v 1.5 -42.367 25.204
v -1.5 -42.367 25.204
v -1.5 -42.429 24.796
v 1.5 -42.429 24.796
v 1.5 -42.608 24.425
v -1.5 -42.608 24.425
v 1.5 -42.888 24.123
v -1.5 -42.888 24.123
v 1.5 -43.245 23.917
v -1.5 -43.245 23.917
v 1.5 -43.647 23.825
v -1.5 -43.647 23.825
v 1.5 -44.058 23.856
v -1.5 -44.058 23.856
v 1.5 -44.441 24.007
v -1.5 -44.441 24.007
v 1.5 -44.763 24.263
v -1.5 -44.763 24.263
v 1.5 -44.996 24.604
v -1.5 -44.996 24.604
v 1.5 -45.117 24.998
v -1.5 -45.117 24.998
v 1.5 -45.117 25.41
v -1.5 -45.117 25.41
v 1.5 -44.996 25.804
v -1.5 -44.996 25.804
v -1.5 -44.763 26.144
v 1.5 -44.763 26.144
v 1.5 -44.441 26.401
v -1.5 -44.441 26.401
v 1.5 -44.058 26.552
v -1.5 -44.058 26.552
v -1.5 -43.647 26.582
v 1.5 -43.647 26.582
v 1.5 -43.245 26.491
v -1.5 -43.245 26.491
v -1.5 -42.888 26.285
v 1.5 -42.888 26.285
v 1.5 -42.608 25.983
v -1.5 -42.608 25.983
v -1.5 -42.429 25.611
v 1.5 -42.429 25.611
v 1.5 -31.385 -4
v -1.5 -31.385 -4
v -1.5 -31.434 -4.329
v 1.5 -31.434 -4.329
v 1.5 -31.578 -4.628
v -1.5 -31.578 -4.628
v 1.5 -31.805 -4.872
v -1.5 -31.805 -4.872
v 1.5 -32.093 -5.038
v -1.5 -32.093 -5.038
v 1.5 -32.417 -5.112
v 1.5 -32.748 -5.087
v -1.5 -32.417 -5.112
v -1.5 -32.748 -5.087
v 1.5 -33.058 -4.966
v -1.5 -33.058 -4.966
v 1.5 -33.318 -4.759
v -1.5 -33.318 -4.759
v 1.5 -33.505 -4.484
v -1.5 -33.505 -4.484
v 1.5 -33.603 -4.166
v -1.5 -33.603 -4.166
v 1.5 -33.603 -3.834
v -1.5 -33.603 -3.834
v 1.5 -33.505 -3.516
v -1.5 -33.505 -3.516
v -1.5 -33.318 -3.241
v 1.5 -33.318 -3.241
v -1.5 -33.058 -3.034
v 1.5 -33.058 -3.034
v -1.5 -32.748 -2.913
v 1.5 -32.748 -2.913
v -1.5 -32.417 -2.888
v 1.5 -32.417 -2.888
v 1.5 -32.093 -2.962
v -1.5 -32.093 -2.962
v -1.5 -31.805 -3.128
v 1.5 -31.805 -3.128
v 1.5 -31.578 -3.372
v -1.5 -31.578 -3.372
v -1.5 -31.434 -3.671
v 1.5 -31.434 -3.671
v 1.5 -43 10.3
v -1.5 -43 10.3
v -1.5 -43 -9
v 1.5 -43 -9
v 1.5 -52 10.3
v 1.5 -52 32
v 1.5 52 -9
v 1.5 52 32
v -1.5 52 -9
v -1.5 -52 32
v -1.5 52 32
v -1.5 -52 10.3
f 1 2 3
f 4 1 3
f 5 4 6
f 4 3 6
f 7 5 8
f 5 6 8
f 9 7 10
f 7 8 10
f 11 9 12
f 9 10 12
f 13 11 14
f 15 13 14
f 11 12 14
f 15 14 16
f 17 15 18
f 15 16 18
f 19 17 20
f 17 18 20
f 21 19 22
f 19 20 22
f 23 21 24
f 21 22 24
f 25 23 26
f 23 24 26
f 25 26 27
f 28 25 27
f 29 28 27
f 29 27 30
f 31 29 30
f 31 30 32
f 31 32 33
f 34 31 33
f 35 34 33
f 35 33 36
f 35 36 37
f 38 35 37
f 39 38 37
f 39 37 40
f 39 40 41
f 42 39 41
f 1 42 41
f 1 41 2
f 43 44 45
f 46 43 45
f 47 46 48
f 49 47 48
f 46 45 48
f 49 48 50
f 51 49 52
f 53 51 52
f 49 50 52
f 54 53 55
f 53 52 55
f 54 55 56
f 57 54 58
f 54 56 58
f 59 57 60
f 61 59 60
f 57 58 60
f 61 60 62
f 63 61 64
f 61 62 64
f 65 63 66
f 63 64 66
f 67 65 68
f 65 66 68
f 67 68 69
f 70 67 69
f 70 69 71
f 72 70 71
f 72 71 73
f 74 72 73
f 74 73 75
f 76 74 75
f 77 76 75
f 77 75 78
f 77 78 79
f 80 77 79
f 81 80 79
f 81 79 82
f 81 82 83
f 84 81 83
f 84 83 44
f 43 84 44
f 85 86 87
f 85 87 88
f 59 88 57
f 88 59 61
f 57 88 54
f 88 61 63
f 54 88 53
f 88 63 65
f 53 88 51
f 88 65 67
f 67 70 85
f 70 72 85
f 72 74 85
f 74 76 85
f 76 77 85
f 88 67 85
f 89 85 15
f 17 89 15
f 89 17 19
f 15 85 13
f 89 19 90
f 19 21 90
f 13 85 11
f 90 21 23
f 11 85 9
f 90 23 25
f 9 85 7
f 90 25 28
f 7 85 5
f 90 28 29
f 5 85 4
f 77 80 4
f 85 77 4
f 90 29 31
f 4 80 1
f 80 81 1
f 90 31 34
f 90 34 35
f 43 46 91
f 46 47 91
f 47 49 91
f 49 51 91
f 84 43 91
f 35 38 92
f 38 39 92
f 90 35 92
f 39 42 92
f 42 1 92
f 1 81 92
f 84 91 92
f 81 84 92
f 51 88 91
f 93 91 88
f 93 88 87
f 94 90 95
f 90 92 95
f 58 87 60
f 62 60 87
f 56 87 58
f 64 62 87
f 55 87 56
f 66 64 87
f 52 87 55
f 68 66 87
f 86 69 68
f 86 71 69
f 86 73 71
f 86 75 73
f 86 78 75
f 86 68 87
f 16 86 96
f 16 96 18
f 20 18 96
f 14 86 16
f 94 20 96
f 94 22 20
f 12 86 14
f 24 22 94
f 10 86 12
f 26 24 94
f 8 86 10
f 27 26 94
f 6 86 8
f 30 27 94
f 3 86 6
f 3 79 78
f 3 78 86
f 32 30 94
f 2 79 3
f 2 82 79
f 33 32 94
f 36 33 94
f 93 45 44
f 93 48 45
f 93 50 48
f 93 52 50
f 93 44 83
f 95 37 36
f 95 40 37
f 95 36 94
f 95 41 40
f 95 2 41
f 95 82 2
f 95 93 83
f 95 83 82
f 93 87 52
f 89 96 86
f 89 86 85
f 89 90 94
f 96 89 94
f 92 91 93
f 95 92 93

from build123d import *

# Parameters (mm, degrees)
SKETCH022_W      = 3
SKETCH022_H      = 41
PAD009_DEPTH     = 52
SKETCH023_W      = 3
SKETCH023_H      = 19.3
POCKET011_DEPTH  = 9
SHAPEBINDER008_R = 1.115297
POCKET034_DEPTH  = 5
SHAPEBINDER009_R = 1.382536
POCKET035_DEPTH  = 7.001


with BuildPart() as part:
    # Sketch022 (on ShapeBinder) → Pad009 (new body, symmetric)
    with BuildSketch(Plane(origin=(0, 0, 0), x_dir=(-1, 0, 0), z_dir=(0, 1, 0))):
        with Locations((0, 11.5)):
            Rectangle(SKETCH022_W, SKETCH022_H)
    extrude(amount=PAD009_DEPTH, both=True)

    # Sketch023 (on Face5 of Pad009) → Pocket011 (cut)
    with BuildSketch(Plane.XZ.offset(52)):
        with Locations((0, 0.65)):
            Rectangle(SKETCH023_W, SKETCH023_H)
    extrude(amount=-POCKET011_DEPTH, mode=Mode.SUBTRACT)

    # ShapeBinder008 → Pocket034 (cut)
    with BuildSketch(Plane(origin=(-1.5, -32.5, -4), x_dir=(0, 1, 0), z_dir=(-1, 0, 0))):
        Circle(SHAPEBINDER008_R)
    extrude(amount=-POCKET034_DEPTH, mode=Mode.SUBTRACT)

    # ShapeBinder009 → Pocket035 (cut, through all)
    with BuildSketch(Plane(origin=(-5.5, -43.75, 25.203825), x_dir=(0, 1, 0), z_dir=(-1, 0, 0))):
        Circle(SHAPEBINDER009_R)
    extrude(amount=-POCKET035_DEPTH, mode=Mode.SUBTRACT)


solid = part.part
